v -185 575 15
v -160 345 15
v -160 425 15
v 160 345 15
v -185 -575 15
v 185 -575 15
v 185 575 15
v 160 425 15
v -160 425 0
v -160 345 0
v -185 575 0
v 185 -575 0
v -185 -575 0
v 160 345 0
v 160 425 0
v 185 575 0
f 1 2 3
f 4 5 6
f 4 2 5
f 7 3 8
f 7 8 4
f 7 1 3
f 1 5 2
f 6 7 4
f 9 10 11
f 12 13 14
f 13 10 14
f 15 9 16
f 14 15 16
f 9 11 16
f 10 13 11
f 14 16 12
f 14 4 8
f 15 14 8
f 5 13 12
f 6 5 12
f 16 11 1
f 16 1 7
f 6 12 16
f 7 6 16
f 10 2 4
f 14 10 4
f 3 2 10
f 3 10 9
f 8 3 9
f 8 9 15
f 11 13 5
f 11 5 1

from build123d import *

# Parameters (mm, degrees)
ESBO_O1_W                = 370
ESBO_O1_H                = 1150
RESSALTO_EXTRUS_O1_DEPTH = 15
ESBO_O2_W                = 320
ESBO_O2_H                = 80
CORTE_EXTRUS_O1_DEPTH    = 15


with BuildPart() as part:
    # Esboço1 → Ressalto-extrusão1 (new body)
    with BuildSketch(Plane.XY):
        Rectangle(ESBO_O1_W, ESBO_O1_H)
    extrude(amount=RESSALTO_EXTRUS_O1_DEPTH)

    # Esboço2 → Corte-extrusão1 (cut)
    with BuildSketch(Plane.XY.offset(15)):
        with Locations((0, 385)):
            Rectangle(ESBO_O2_W, ESBO_O2_H)
    extrude(amount=-CORTE_EXTRUS_O1_DEPTH, mode=Mode.SUBTRACT)


solid = part.part
